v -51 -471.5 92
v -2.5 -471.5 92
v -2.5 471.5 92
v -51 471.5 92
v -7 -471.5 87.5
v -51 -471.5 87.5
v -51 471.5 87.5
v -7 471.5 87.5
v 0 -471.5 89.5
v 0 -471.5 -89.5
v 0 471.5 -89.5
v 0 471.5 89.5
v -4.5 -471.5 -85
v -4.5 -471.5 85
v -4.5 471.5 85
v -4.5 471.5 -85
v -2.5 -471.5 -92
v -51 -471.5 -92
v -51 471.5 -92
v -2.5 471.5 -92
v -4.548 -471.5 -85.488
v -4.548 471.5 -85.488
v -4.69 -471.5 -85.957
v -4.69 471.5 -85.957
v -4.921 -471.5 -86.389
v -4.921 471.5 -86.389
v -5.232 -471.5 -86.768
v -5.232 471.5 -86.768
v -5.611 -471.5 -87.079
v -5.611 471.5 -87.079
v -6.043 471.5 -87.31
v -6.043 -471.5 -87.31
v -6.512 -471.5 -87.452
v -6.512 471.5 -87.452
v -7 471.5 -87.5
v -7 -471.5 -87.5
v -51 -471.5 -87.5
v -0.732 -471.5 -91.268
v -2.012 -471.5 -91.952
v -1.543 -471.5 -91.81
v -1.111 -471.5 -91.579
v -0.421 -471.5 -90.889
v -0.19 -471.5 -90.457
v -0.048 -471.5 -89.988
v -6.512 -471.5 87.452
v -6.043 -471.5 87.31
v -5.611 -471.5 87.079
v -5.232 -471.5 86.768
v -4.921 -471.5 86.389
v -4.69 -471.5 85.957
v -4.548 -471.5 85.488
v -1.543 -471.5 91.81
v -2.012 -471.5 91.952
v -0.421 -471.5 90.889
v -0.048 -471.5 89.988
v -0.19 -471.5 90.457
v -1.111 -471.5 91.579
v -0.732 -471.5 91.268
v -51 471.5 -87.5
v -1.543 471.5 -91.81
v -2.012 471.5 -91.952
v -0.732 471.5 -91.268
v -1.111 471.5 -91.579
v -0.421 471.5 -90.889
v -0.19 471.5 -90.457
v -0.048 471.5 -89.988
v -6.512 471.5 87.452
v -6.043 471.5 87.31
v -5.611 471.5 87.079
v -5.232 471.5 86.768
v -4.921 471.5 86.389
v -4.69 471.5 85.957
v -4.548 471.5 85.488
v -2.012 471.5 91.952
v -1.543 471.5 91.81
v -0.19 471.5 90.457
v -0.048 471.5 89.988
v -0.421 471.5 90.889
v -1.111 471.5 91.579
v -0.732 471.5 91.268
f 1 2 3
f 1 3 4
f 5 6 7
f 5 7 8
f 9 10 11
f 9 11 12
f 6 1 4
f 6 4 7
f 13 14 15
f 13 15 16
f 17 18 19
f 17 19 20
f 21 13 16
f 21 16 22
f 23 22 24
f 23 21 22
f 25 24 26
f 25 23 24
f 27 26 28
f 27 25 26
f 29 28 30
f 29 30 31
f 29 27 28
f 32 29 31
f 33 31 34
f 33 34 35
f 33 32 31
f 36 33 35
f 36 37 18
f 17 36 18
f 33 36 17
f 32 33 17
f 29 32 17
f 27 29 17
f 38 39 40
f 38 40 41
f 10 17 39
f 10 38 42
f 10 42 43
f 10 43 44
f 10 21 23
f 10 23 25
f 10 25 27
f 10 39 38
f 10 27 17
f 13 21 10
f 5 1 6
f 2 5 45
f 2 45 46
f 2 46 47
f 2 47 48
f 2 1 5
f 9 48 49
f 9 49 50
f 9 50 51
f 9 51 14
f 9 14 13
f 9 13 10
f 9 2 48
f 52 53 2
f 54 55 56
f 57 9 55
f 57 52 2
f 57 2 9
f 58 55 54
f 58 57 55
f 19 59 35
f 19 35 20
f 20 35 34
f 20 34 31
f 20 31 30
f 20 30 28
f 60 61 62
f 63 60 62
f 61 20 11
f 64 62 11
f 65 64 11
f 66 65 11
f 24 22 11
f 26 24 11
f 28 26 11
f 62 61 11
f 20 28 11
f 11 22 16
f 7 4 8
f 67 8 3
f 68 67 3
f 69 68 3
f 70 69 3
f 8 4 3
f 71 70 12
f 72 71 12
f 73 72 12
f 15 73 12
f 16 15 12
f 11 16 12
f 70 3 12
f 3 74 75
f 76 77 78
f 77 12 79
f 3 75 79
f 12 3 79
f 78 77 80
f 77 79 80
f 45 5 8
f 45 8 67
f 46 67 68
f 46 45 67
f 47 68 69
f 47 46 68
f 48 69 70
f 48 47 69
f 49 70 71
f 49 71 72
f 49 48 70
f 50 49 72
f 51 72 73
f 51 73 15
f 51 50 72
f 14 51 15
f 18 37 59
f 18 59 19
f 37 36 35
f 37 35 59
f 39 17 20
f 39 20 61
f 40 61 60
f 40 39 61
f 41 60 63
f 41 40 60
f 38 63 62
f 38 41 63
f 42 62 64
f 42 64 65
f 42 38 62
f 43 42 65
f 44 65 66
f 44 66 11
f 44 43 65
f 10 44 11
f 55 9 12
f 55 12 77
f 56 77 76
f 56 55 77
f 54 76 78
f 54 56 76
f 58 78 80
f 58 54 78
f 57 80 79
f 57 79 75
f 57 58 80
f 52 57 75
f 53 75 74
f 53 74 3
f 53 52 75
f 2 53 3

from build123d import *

# Parameters (mm, degrees)
F3_DEPTH = 943


with BuildPart() as f3:
    # F2 (on face) → F3 (new body, through all)
    with BuildSketch(Plane.XZ.offset(471.5)):
        with BuildLine():
            ThreePointArc((-2.5, -92), (-0.732233, -91.267767), (0, -89.5))
            Line((0, -89.5), (0, 89.5))
            ThreePointArc((0, 89.5), (-0.732233, 91.267767), (-2.5, 92))
            Line((-2.5, 92), (-51, 92))
            Line((-51, 92), (-51, 87.5))
            Line((-51, 87.5), (-7, 87.5))
            ThreePointArc((-7, 87.5), (-5.232233, 86.767767), (-4.5, 85))
            Line((-4.5, 85), (-4.5, -85))
            ThreePointArc((-4.5, -85), (-5.232233, -86.767767), (-7, -87.5))
            Line((-7, -87.5), (-51, -87.5))
            Line((-51, -87.5), (-51, -92))
            Line((-51, -92), (-2.5, -92))
        make_face()
    extrude(amount=-F3_DEPTH)


solid = f3.part
